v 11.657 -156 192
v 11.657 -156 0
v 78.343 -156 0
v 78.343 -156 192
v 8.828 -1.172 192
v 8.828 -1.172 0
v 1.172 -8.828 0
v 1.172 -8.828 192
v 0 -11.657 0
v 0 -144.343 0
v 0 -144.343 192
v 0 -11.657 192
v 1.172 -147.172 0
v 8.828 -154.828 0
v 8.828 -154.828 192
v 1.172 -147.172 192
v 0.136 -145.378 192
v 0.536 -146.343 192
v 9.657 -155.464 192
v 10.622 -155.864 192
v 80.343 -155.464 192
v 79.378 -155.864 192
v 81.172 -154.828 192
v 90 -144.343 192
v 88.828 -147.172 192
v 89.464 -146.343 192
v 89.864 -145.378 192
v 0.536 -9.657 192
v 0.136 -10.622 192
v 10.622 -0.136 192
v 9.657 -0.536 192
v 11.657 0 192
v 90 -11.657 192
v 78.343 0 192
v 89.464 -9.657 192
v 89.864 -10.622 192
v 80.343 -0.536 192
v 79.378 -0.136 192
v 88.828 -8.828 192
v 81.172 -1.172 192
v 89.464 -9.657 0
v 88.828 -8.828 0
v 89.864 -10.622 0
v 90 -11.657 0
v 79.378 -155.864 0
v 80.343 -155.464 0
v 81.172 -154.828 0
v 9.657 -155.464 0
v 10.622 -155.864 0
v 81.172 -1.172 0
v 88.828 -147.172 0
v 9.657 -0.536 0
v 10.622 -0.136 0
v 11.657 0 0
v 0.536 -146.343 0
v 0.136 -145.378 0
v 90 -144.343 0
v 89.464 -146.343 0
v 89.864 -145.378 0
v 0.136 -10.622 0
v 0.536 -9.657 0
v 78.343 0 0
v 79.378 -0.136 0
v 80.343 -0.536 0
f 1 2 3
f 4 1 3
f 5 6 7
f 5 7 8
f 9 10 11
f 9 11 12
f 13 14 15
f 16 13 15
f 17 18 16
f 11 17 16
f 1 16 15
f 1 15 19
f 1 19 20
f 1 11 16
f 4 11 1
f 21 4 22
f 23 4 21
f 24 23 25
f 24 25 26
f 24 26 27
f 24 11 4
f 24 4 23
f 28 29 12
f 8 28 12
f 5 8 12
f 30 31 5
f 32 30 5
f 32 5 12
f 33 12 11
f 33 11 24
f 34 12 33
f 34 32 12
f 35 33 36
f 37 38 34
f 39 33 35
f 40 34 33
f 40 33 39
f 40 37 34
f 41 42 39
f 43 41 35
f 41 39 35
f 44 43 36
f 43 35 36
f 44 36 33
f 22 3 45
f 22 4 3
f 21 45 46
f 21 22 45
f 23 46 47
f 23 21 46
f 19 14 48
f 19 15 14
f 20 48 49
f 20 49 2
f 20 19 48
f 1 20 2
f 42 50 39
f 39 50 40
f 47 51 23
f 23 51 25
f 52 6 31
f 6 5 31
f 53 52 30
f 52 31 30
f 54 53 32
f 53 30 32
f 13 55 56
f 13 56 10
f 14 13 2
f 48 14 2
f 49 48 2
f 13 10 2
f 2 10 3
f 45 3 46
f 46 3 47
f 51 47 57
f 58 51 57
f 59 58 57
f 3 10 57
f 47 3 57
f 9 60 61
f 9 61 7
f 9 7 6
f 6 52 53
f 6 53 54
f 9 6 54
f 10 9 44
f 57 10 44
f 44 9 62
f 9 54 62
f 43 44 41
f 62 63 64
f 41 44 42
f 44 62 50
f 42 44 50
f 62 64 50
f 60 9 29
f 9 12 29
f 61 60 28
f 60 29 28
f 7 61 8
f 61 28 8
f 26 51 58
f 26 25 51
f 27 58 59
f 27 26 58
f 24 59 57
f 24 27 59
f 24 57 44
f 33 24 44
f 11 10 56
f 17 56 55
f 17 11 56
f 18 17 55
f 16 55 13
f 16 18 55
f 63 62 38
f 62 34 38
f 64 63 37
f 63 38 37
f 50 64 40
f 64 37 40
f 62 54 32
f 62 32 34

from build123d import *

# Parameters (mm, degrees)
SKETCH_1_W      = 90
SKETCH_1_H      = 156
EXTRUDE_1_DEPTH = 192
CHAMFER_1_SIZE  = 10
FILLET_1_R      = 4


with BuildPart() as part:
    # 草图1 → 凸台-拉伸1 (new body)
    with BuildSketch(Plane.XY):
        with Locations((45, -78)):
            Rectangle(SKETCH_1_W, SKETCH_1_H)
    extrude(amount=EXTRUDE_1_DEPTH)

    # 倒角1
    chamfer_1_edges = [part.edges().sort_by_distance(p)[0] for p in [
        (0, 0, 96),
        (90, 0, 96),
        (90, -156, 96),
        (0, -156, 96),
    ]]
    chamfer(chamfer_1_edges, length=CHAMFER_1_SIZE)

    # 圆角1
    fillet_1_edges = [part.edges().sort_by_distance(p)[0] for p in [
        (80, -156, 96),
        (10, -156, 96),
        (0, -10, 96),
        (0, -146, 96),
        (90, -10, 96),
        (90, -146, 96),
        (80, 0, 96),
        (10, 0, 96),
    ]]
    fillet(fillet_1_edges, radius=FILLET_1_R)


solid = part.part
